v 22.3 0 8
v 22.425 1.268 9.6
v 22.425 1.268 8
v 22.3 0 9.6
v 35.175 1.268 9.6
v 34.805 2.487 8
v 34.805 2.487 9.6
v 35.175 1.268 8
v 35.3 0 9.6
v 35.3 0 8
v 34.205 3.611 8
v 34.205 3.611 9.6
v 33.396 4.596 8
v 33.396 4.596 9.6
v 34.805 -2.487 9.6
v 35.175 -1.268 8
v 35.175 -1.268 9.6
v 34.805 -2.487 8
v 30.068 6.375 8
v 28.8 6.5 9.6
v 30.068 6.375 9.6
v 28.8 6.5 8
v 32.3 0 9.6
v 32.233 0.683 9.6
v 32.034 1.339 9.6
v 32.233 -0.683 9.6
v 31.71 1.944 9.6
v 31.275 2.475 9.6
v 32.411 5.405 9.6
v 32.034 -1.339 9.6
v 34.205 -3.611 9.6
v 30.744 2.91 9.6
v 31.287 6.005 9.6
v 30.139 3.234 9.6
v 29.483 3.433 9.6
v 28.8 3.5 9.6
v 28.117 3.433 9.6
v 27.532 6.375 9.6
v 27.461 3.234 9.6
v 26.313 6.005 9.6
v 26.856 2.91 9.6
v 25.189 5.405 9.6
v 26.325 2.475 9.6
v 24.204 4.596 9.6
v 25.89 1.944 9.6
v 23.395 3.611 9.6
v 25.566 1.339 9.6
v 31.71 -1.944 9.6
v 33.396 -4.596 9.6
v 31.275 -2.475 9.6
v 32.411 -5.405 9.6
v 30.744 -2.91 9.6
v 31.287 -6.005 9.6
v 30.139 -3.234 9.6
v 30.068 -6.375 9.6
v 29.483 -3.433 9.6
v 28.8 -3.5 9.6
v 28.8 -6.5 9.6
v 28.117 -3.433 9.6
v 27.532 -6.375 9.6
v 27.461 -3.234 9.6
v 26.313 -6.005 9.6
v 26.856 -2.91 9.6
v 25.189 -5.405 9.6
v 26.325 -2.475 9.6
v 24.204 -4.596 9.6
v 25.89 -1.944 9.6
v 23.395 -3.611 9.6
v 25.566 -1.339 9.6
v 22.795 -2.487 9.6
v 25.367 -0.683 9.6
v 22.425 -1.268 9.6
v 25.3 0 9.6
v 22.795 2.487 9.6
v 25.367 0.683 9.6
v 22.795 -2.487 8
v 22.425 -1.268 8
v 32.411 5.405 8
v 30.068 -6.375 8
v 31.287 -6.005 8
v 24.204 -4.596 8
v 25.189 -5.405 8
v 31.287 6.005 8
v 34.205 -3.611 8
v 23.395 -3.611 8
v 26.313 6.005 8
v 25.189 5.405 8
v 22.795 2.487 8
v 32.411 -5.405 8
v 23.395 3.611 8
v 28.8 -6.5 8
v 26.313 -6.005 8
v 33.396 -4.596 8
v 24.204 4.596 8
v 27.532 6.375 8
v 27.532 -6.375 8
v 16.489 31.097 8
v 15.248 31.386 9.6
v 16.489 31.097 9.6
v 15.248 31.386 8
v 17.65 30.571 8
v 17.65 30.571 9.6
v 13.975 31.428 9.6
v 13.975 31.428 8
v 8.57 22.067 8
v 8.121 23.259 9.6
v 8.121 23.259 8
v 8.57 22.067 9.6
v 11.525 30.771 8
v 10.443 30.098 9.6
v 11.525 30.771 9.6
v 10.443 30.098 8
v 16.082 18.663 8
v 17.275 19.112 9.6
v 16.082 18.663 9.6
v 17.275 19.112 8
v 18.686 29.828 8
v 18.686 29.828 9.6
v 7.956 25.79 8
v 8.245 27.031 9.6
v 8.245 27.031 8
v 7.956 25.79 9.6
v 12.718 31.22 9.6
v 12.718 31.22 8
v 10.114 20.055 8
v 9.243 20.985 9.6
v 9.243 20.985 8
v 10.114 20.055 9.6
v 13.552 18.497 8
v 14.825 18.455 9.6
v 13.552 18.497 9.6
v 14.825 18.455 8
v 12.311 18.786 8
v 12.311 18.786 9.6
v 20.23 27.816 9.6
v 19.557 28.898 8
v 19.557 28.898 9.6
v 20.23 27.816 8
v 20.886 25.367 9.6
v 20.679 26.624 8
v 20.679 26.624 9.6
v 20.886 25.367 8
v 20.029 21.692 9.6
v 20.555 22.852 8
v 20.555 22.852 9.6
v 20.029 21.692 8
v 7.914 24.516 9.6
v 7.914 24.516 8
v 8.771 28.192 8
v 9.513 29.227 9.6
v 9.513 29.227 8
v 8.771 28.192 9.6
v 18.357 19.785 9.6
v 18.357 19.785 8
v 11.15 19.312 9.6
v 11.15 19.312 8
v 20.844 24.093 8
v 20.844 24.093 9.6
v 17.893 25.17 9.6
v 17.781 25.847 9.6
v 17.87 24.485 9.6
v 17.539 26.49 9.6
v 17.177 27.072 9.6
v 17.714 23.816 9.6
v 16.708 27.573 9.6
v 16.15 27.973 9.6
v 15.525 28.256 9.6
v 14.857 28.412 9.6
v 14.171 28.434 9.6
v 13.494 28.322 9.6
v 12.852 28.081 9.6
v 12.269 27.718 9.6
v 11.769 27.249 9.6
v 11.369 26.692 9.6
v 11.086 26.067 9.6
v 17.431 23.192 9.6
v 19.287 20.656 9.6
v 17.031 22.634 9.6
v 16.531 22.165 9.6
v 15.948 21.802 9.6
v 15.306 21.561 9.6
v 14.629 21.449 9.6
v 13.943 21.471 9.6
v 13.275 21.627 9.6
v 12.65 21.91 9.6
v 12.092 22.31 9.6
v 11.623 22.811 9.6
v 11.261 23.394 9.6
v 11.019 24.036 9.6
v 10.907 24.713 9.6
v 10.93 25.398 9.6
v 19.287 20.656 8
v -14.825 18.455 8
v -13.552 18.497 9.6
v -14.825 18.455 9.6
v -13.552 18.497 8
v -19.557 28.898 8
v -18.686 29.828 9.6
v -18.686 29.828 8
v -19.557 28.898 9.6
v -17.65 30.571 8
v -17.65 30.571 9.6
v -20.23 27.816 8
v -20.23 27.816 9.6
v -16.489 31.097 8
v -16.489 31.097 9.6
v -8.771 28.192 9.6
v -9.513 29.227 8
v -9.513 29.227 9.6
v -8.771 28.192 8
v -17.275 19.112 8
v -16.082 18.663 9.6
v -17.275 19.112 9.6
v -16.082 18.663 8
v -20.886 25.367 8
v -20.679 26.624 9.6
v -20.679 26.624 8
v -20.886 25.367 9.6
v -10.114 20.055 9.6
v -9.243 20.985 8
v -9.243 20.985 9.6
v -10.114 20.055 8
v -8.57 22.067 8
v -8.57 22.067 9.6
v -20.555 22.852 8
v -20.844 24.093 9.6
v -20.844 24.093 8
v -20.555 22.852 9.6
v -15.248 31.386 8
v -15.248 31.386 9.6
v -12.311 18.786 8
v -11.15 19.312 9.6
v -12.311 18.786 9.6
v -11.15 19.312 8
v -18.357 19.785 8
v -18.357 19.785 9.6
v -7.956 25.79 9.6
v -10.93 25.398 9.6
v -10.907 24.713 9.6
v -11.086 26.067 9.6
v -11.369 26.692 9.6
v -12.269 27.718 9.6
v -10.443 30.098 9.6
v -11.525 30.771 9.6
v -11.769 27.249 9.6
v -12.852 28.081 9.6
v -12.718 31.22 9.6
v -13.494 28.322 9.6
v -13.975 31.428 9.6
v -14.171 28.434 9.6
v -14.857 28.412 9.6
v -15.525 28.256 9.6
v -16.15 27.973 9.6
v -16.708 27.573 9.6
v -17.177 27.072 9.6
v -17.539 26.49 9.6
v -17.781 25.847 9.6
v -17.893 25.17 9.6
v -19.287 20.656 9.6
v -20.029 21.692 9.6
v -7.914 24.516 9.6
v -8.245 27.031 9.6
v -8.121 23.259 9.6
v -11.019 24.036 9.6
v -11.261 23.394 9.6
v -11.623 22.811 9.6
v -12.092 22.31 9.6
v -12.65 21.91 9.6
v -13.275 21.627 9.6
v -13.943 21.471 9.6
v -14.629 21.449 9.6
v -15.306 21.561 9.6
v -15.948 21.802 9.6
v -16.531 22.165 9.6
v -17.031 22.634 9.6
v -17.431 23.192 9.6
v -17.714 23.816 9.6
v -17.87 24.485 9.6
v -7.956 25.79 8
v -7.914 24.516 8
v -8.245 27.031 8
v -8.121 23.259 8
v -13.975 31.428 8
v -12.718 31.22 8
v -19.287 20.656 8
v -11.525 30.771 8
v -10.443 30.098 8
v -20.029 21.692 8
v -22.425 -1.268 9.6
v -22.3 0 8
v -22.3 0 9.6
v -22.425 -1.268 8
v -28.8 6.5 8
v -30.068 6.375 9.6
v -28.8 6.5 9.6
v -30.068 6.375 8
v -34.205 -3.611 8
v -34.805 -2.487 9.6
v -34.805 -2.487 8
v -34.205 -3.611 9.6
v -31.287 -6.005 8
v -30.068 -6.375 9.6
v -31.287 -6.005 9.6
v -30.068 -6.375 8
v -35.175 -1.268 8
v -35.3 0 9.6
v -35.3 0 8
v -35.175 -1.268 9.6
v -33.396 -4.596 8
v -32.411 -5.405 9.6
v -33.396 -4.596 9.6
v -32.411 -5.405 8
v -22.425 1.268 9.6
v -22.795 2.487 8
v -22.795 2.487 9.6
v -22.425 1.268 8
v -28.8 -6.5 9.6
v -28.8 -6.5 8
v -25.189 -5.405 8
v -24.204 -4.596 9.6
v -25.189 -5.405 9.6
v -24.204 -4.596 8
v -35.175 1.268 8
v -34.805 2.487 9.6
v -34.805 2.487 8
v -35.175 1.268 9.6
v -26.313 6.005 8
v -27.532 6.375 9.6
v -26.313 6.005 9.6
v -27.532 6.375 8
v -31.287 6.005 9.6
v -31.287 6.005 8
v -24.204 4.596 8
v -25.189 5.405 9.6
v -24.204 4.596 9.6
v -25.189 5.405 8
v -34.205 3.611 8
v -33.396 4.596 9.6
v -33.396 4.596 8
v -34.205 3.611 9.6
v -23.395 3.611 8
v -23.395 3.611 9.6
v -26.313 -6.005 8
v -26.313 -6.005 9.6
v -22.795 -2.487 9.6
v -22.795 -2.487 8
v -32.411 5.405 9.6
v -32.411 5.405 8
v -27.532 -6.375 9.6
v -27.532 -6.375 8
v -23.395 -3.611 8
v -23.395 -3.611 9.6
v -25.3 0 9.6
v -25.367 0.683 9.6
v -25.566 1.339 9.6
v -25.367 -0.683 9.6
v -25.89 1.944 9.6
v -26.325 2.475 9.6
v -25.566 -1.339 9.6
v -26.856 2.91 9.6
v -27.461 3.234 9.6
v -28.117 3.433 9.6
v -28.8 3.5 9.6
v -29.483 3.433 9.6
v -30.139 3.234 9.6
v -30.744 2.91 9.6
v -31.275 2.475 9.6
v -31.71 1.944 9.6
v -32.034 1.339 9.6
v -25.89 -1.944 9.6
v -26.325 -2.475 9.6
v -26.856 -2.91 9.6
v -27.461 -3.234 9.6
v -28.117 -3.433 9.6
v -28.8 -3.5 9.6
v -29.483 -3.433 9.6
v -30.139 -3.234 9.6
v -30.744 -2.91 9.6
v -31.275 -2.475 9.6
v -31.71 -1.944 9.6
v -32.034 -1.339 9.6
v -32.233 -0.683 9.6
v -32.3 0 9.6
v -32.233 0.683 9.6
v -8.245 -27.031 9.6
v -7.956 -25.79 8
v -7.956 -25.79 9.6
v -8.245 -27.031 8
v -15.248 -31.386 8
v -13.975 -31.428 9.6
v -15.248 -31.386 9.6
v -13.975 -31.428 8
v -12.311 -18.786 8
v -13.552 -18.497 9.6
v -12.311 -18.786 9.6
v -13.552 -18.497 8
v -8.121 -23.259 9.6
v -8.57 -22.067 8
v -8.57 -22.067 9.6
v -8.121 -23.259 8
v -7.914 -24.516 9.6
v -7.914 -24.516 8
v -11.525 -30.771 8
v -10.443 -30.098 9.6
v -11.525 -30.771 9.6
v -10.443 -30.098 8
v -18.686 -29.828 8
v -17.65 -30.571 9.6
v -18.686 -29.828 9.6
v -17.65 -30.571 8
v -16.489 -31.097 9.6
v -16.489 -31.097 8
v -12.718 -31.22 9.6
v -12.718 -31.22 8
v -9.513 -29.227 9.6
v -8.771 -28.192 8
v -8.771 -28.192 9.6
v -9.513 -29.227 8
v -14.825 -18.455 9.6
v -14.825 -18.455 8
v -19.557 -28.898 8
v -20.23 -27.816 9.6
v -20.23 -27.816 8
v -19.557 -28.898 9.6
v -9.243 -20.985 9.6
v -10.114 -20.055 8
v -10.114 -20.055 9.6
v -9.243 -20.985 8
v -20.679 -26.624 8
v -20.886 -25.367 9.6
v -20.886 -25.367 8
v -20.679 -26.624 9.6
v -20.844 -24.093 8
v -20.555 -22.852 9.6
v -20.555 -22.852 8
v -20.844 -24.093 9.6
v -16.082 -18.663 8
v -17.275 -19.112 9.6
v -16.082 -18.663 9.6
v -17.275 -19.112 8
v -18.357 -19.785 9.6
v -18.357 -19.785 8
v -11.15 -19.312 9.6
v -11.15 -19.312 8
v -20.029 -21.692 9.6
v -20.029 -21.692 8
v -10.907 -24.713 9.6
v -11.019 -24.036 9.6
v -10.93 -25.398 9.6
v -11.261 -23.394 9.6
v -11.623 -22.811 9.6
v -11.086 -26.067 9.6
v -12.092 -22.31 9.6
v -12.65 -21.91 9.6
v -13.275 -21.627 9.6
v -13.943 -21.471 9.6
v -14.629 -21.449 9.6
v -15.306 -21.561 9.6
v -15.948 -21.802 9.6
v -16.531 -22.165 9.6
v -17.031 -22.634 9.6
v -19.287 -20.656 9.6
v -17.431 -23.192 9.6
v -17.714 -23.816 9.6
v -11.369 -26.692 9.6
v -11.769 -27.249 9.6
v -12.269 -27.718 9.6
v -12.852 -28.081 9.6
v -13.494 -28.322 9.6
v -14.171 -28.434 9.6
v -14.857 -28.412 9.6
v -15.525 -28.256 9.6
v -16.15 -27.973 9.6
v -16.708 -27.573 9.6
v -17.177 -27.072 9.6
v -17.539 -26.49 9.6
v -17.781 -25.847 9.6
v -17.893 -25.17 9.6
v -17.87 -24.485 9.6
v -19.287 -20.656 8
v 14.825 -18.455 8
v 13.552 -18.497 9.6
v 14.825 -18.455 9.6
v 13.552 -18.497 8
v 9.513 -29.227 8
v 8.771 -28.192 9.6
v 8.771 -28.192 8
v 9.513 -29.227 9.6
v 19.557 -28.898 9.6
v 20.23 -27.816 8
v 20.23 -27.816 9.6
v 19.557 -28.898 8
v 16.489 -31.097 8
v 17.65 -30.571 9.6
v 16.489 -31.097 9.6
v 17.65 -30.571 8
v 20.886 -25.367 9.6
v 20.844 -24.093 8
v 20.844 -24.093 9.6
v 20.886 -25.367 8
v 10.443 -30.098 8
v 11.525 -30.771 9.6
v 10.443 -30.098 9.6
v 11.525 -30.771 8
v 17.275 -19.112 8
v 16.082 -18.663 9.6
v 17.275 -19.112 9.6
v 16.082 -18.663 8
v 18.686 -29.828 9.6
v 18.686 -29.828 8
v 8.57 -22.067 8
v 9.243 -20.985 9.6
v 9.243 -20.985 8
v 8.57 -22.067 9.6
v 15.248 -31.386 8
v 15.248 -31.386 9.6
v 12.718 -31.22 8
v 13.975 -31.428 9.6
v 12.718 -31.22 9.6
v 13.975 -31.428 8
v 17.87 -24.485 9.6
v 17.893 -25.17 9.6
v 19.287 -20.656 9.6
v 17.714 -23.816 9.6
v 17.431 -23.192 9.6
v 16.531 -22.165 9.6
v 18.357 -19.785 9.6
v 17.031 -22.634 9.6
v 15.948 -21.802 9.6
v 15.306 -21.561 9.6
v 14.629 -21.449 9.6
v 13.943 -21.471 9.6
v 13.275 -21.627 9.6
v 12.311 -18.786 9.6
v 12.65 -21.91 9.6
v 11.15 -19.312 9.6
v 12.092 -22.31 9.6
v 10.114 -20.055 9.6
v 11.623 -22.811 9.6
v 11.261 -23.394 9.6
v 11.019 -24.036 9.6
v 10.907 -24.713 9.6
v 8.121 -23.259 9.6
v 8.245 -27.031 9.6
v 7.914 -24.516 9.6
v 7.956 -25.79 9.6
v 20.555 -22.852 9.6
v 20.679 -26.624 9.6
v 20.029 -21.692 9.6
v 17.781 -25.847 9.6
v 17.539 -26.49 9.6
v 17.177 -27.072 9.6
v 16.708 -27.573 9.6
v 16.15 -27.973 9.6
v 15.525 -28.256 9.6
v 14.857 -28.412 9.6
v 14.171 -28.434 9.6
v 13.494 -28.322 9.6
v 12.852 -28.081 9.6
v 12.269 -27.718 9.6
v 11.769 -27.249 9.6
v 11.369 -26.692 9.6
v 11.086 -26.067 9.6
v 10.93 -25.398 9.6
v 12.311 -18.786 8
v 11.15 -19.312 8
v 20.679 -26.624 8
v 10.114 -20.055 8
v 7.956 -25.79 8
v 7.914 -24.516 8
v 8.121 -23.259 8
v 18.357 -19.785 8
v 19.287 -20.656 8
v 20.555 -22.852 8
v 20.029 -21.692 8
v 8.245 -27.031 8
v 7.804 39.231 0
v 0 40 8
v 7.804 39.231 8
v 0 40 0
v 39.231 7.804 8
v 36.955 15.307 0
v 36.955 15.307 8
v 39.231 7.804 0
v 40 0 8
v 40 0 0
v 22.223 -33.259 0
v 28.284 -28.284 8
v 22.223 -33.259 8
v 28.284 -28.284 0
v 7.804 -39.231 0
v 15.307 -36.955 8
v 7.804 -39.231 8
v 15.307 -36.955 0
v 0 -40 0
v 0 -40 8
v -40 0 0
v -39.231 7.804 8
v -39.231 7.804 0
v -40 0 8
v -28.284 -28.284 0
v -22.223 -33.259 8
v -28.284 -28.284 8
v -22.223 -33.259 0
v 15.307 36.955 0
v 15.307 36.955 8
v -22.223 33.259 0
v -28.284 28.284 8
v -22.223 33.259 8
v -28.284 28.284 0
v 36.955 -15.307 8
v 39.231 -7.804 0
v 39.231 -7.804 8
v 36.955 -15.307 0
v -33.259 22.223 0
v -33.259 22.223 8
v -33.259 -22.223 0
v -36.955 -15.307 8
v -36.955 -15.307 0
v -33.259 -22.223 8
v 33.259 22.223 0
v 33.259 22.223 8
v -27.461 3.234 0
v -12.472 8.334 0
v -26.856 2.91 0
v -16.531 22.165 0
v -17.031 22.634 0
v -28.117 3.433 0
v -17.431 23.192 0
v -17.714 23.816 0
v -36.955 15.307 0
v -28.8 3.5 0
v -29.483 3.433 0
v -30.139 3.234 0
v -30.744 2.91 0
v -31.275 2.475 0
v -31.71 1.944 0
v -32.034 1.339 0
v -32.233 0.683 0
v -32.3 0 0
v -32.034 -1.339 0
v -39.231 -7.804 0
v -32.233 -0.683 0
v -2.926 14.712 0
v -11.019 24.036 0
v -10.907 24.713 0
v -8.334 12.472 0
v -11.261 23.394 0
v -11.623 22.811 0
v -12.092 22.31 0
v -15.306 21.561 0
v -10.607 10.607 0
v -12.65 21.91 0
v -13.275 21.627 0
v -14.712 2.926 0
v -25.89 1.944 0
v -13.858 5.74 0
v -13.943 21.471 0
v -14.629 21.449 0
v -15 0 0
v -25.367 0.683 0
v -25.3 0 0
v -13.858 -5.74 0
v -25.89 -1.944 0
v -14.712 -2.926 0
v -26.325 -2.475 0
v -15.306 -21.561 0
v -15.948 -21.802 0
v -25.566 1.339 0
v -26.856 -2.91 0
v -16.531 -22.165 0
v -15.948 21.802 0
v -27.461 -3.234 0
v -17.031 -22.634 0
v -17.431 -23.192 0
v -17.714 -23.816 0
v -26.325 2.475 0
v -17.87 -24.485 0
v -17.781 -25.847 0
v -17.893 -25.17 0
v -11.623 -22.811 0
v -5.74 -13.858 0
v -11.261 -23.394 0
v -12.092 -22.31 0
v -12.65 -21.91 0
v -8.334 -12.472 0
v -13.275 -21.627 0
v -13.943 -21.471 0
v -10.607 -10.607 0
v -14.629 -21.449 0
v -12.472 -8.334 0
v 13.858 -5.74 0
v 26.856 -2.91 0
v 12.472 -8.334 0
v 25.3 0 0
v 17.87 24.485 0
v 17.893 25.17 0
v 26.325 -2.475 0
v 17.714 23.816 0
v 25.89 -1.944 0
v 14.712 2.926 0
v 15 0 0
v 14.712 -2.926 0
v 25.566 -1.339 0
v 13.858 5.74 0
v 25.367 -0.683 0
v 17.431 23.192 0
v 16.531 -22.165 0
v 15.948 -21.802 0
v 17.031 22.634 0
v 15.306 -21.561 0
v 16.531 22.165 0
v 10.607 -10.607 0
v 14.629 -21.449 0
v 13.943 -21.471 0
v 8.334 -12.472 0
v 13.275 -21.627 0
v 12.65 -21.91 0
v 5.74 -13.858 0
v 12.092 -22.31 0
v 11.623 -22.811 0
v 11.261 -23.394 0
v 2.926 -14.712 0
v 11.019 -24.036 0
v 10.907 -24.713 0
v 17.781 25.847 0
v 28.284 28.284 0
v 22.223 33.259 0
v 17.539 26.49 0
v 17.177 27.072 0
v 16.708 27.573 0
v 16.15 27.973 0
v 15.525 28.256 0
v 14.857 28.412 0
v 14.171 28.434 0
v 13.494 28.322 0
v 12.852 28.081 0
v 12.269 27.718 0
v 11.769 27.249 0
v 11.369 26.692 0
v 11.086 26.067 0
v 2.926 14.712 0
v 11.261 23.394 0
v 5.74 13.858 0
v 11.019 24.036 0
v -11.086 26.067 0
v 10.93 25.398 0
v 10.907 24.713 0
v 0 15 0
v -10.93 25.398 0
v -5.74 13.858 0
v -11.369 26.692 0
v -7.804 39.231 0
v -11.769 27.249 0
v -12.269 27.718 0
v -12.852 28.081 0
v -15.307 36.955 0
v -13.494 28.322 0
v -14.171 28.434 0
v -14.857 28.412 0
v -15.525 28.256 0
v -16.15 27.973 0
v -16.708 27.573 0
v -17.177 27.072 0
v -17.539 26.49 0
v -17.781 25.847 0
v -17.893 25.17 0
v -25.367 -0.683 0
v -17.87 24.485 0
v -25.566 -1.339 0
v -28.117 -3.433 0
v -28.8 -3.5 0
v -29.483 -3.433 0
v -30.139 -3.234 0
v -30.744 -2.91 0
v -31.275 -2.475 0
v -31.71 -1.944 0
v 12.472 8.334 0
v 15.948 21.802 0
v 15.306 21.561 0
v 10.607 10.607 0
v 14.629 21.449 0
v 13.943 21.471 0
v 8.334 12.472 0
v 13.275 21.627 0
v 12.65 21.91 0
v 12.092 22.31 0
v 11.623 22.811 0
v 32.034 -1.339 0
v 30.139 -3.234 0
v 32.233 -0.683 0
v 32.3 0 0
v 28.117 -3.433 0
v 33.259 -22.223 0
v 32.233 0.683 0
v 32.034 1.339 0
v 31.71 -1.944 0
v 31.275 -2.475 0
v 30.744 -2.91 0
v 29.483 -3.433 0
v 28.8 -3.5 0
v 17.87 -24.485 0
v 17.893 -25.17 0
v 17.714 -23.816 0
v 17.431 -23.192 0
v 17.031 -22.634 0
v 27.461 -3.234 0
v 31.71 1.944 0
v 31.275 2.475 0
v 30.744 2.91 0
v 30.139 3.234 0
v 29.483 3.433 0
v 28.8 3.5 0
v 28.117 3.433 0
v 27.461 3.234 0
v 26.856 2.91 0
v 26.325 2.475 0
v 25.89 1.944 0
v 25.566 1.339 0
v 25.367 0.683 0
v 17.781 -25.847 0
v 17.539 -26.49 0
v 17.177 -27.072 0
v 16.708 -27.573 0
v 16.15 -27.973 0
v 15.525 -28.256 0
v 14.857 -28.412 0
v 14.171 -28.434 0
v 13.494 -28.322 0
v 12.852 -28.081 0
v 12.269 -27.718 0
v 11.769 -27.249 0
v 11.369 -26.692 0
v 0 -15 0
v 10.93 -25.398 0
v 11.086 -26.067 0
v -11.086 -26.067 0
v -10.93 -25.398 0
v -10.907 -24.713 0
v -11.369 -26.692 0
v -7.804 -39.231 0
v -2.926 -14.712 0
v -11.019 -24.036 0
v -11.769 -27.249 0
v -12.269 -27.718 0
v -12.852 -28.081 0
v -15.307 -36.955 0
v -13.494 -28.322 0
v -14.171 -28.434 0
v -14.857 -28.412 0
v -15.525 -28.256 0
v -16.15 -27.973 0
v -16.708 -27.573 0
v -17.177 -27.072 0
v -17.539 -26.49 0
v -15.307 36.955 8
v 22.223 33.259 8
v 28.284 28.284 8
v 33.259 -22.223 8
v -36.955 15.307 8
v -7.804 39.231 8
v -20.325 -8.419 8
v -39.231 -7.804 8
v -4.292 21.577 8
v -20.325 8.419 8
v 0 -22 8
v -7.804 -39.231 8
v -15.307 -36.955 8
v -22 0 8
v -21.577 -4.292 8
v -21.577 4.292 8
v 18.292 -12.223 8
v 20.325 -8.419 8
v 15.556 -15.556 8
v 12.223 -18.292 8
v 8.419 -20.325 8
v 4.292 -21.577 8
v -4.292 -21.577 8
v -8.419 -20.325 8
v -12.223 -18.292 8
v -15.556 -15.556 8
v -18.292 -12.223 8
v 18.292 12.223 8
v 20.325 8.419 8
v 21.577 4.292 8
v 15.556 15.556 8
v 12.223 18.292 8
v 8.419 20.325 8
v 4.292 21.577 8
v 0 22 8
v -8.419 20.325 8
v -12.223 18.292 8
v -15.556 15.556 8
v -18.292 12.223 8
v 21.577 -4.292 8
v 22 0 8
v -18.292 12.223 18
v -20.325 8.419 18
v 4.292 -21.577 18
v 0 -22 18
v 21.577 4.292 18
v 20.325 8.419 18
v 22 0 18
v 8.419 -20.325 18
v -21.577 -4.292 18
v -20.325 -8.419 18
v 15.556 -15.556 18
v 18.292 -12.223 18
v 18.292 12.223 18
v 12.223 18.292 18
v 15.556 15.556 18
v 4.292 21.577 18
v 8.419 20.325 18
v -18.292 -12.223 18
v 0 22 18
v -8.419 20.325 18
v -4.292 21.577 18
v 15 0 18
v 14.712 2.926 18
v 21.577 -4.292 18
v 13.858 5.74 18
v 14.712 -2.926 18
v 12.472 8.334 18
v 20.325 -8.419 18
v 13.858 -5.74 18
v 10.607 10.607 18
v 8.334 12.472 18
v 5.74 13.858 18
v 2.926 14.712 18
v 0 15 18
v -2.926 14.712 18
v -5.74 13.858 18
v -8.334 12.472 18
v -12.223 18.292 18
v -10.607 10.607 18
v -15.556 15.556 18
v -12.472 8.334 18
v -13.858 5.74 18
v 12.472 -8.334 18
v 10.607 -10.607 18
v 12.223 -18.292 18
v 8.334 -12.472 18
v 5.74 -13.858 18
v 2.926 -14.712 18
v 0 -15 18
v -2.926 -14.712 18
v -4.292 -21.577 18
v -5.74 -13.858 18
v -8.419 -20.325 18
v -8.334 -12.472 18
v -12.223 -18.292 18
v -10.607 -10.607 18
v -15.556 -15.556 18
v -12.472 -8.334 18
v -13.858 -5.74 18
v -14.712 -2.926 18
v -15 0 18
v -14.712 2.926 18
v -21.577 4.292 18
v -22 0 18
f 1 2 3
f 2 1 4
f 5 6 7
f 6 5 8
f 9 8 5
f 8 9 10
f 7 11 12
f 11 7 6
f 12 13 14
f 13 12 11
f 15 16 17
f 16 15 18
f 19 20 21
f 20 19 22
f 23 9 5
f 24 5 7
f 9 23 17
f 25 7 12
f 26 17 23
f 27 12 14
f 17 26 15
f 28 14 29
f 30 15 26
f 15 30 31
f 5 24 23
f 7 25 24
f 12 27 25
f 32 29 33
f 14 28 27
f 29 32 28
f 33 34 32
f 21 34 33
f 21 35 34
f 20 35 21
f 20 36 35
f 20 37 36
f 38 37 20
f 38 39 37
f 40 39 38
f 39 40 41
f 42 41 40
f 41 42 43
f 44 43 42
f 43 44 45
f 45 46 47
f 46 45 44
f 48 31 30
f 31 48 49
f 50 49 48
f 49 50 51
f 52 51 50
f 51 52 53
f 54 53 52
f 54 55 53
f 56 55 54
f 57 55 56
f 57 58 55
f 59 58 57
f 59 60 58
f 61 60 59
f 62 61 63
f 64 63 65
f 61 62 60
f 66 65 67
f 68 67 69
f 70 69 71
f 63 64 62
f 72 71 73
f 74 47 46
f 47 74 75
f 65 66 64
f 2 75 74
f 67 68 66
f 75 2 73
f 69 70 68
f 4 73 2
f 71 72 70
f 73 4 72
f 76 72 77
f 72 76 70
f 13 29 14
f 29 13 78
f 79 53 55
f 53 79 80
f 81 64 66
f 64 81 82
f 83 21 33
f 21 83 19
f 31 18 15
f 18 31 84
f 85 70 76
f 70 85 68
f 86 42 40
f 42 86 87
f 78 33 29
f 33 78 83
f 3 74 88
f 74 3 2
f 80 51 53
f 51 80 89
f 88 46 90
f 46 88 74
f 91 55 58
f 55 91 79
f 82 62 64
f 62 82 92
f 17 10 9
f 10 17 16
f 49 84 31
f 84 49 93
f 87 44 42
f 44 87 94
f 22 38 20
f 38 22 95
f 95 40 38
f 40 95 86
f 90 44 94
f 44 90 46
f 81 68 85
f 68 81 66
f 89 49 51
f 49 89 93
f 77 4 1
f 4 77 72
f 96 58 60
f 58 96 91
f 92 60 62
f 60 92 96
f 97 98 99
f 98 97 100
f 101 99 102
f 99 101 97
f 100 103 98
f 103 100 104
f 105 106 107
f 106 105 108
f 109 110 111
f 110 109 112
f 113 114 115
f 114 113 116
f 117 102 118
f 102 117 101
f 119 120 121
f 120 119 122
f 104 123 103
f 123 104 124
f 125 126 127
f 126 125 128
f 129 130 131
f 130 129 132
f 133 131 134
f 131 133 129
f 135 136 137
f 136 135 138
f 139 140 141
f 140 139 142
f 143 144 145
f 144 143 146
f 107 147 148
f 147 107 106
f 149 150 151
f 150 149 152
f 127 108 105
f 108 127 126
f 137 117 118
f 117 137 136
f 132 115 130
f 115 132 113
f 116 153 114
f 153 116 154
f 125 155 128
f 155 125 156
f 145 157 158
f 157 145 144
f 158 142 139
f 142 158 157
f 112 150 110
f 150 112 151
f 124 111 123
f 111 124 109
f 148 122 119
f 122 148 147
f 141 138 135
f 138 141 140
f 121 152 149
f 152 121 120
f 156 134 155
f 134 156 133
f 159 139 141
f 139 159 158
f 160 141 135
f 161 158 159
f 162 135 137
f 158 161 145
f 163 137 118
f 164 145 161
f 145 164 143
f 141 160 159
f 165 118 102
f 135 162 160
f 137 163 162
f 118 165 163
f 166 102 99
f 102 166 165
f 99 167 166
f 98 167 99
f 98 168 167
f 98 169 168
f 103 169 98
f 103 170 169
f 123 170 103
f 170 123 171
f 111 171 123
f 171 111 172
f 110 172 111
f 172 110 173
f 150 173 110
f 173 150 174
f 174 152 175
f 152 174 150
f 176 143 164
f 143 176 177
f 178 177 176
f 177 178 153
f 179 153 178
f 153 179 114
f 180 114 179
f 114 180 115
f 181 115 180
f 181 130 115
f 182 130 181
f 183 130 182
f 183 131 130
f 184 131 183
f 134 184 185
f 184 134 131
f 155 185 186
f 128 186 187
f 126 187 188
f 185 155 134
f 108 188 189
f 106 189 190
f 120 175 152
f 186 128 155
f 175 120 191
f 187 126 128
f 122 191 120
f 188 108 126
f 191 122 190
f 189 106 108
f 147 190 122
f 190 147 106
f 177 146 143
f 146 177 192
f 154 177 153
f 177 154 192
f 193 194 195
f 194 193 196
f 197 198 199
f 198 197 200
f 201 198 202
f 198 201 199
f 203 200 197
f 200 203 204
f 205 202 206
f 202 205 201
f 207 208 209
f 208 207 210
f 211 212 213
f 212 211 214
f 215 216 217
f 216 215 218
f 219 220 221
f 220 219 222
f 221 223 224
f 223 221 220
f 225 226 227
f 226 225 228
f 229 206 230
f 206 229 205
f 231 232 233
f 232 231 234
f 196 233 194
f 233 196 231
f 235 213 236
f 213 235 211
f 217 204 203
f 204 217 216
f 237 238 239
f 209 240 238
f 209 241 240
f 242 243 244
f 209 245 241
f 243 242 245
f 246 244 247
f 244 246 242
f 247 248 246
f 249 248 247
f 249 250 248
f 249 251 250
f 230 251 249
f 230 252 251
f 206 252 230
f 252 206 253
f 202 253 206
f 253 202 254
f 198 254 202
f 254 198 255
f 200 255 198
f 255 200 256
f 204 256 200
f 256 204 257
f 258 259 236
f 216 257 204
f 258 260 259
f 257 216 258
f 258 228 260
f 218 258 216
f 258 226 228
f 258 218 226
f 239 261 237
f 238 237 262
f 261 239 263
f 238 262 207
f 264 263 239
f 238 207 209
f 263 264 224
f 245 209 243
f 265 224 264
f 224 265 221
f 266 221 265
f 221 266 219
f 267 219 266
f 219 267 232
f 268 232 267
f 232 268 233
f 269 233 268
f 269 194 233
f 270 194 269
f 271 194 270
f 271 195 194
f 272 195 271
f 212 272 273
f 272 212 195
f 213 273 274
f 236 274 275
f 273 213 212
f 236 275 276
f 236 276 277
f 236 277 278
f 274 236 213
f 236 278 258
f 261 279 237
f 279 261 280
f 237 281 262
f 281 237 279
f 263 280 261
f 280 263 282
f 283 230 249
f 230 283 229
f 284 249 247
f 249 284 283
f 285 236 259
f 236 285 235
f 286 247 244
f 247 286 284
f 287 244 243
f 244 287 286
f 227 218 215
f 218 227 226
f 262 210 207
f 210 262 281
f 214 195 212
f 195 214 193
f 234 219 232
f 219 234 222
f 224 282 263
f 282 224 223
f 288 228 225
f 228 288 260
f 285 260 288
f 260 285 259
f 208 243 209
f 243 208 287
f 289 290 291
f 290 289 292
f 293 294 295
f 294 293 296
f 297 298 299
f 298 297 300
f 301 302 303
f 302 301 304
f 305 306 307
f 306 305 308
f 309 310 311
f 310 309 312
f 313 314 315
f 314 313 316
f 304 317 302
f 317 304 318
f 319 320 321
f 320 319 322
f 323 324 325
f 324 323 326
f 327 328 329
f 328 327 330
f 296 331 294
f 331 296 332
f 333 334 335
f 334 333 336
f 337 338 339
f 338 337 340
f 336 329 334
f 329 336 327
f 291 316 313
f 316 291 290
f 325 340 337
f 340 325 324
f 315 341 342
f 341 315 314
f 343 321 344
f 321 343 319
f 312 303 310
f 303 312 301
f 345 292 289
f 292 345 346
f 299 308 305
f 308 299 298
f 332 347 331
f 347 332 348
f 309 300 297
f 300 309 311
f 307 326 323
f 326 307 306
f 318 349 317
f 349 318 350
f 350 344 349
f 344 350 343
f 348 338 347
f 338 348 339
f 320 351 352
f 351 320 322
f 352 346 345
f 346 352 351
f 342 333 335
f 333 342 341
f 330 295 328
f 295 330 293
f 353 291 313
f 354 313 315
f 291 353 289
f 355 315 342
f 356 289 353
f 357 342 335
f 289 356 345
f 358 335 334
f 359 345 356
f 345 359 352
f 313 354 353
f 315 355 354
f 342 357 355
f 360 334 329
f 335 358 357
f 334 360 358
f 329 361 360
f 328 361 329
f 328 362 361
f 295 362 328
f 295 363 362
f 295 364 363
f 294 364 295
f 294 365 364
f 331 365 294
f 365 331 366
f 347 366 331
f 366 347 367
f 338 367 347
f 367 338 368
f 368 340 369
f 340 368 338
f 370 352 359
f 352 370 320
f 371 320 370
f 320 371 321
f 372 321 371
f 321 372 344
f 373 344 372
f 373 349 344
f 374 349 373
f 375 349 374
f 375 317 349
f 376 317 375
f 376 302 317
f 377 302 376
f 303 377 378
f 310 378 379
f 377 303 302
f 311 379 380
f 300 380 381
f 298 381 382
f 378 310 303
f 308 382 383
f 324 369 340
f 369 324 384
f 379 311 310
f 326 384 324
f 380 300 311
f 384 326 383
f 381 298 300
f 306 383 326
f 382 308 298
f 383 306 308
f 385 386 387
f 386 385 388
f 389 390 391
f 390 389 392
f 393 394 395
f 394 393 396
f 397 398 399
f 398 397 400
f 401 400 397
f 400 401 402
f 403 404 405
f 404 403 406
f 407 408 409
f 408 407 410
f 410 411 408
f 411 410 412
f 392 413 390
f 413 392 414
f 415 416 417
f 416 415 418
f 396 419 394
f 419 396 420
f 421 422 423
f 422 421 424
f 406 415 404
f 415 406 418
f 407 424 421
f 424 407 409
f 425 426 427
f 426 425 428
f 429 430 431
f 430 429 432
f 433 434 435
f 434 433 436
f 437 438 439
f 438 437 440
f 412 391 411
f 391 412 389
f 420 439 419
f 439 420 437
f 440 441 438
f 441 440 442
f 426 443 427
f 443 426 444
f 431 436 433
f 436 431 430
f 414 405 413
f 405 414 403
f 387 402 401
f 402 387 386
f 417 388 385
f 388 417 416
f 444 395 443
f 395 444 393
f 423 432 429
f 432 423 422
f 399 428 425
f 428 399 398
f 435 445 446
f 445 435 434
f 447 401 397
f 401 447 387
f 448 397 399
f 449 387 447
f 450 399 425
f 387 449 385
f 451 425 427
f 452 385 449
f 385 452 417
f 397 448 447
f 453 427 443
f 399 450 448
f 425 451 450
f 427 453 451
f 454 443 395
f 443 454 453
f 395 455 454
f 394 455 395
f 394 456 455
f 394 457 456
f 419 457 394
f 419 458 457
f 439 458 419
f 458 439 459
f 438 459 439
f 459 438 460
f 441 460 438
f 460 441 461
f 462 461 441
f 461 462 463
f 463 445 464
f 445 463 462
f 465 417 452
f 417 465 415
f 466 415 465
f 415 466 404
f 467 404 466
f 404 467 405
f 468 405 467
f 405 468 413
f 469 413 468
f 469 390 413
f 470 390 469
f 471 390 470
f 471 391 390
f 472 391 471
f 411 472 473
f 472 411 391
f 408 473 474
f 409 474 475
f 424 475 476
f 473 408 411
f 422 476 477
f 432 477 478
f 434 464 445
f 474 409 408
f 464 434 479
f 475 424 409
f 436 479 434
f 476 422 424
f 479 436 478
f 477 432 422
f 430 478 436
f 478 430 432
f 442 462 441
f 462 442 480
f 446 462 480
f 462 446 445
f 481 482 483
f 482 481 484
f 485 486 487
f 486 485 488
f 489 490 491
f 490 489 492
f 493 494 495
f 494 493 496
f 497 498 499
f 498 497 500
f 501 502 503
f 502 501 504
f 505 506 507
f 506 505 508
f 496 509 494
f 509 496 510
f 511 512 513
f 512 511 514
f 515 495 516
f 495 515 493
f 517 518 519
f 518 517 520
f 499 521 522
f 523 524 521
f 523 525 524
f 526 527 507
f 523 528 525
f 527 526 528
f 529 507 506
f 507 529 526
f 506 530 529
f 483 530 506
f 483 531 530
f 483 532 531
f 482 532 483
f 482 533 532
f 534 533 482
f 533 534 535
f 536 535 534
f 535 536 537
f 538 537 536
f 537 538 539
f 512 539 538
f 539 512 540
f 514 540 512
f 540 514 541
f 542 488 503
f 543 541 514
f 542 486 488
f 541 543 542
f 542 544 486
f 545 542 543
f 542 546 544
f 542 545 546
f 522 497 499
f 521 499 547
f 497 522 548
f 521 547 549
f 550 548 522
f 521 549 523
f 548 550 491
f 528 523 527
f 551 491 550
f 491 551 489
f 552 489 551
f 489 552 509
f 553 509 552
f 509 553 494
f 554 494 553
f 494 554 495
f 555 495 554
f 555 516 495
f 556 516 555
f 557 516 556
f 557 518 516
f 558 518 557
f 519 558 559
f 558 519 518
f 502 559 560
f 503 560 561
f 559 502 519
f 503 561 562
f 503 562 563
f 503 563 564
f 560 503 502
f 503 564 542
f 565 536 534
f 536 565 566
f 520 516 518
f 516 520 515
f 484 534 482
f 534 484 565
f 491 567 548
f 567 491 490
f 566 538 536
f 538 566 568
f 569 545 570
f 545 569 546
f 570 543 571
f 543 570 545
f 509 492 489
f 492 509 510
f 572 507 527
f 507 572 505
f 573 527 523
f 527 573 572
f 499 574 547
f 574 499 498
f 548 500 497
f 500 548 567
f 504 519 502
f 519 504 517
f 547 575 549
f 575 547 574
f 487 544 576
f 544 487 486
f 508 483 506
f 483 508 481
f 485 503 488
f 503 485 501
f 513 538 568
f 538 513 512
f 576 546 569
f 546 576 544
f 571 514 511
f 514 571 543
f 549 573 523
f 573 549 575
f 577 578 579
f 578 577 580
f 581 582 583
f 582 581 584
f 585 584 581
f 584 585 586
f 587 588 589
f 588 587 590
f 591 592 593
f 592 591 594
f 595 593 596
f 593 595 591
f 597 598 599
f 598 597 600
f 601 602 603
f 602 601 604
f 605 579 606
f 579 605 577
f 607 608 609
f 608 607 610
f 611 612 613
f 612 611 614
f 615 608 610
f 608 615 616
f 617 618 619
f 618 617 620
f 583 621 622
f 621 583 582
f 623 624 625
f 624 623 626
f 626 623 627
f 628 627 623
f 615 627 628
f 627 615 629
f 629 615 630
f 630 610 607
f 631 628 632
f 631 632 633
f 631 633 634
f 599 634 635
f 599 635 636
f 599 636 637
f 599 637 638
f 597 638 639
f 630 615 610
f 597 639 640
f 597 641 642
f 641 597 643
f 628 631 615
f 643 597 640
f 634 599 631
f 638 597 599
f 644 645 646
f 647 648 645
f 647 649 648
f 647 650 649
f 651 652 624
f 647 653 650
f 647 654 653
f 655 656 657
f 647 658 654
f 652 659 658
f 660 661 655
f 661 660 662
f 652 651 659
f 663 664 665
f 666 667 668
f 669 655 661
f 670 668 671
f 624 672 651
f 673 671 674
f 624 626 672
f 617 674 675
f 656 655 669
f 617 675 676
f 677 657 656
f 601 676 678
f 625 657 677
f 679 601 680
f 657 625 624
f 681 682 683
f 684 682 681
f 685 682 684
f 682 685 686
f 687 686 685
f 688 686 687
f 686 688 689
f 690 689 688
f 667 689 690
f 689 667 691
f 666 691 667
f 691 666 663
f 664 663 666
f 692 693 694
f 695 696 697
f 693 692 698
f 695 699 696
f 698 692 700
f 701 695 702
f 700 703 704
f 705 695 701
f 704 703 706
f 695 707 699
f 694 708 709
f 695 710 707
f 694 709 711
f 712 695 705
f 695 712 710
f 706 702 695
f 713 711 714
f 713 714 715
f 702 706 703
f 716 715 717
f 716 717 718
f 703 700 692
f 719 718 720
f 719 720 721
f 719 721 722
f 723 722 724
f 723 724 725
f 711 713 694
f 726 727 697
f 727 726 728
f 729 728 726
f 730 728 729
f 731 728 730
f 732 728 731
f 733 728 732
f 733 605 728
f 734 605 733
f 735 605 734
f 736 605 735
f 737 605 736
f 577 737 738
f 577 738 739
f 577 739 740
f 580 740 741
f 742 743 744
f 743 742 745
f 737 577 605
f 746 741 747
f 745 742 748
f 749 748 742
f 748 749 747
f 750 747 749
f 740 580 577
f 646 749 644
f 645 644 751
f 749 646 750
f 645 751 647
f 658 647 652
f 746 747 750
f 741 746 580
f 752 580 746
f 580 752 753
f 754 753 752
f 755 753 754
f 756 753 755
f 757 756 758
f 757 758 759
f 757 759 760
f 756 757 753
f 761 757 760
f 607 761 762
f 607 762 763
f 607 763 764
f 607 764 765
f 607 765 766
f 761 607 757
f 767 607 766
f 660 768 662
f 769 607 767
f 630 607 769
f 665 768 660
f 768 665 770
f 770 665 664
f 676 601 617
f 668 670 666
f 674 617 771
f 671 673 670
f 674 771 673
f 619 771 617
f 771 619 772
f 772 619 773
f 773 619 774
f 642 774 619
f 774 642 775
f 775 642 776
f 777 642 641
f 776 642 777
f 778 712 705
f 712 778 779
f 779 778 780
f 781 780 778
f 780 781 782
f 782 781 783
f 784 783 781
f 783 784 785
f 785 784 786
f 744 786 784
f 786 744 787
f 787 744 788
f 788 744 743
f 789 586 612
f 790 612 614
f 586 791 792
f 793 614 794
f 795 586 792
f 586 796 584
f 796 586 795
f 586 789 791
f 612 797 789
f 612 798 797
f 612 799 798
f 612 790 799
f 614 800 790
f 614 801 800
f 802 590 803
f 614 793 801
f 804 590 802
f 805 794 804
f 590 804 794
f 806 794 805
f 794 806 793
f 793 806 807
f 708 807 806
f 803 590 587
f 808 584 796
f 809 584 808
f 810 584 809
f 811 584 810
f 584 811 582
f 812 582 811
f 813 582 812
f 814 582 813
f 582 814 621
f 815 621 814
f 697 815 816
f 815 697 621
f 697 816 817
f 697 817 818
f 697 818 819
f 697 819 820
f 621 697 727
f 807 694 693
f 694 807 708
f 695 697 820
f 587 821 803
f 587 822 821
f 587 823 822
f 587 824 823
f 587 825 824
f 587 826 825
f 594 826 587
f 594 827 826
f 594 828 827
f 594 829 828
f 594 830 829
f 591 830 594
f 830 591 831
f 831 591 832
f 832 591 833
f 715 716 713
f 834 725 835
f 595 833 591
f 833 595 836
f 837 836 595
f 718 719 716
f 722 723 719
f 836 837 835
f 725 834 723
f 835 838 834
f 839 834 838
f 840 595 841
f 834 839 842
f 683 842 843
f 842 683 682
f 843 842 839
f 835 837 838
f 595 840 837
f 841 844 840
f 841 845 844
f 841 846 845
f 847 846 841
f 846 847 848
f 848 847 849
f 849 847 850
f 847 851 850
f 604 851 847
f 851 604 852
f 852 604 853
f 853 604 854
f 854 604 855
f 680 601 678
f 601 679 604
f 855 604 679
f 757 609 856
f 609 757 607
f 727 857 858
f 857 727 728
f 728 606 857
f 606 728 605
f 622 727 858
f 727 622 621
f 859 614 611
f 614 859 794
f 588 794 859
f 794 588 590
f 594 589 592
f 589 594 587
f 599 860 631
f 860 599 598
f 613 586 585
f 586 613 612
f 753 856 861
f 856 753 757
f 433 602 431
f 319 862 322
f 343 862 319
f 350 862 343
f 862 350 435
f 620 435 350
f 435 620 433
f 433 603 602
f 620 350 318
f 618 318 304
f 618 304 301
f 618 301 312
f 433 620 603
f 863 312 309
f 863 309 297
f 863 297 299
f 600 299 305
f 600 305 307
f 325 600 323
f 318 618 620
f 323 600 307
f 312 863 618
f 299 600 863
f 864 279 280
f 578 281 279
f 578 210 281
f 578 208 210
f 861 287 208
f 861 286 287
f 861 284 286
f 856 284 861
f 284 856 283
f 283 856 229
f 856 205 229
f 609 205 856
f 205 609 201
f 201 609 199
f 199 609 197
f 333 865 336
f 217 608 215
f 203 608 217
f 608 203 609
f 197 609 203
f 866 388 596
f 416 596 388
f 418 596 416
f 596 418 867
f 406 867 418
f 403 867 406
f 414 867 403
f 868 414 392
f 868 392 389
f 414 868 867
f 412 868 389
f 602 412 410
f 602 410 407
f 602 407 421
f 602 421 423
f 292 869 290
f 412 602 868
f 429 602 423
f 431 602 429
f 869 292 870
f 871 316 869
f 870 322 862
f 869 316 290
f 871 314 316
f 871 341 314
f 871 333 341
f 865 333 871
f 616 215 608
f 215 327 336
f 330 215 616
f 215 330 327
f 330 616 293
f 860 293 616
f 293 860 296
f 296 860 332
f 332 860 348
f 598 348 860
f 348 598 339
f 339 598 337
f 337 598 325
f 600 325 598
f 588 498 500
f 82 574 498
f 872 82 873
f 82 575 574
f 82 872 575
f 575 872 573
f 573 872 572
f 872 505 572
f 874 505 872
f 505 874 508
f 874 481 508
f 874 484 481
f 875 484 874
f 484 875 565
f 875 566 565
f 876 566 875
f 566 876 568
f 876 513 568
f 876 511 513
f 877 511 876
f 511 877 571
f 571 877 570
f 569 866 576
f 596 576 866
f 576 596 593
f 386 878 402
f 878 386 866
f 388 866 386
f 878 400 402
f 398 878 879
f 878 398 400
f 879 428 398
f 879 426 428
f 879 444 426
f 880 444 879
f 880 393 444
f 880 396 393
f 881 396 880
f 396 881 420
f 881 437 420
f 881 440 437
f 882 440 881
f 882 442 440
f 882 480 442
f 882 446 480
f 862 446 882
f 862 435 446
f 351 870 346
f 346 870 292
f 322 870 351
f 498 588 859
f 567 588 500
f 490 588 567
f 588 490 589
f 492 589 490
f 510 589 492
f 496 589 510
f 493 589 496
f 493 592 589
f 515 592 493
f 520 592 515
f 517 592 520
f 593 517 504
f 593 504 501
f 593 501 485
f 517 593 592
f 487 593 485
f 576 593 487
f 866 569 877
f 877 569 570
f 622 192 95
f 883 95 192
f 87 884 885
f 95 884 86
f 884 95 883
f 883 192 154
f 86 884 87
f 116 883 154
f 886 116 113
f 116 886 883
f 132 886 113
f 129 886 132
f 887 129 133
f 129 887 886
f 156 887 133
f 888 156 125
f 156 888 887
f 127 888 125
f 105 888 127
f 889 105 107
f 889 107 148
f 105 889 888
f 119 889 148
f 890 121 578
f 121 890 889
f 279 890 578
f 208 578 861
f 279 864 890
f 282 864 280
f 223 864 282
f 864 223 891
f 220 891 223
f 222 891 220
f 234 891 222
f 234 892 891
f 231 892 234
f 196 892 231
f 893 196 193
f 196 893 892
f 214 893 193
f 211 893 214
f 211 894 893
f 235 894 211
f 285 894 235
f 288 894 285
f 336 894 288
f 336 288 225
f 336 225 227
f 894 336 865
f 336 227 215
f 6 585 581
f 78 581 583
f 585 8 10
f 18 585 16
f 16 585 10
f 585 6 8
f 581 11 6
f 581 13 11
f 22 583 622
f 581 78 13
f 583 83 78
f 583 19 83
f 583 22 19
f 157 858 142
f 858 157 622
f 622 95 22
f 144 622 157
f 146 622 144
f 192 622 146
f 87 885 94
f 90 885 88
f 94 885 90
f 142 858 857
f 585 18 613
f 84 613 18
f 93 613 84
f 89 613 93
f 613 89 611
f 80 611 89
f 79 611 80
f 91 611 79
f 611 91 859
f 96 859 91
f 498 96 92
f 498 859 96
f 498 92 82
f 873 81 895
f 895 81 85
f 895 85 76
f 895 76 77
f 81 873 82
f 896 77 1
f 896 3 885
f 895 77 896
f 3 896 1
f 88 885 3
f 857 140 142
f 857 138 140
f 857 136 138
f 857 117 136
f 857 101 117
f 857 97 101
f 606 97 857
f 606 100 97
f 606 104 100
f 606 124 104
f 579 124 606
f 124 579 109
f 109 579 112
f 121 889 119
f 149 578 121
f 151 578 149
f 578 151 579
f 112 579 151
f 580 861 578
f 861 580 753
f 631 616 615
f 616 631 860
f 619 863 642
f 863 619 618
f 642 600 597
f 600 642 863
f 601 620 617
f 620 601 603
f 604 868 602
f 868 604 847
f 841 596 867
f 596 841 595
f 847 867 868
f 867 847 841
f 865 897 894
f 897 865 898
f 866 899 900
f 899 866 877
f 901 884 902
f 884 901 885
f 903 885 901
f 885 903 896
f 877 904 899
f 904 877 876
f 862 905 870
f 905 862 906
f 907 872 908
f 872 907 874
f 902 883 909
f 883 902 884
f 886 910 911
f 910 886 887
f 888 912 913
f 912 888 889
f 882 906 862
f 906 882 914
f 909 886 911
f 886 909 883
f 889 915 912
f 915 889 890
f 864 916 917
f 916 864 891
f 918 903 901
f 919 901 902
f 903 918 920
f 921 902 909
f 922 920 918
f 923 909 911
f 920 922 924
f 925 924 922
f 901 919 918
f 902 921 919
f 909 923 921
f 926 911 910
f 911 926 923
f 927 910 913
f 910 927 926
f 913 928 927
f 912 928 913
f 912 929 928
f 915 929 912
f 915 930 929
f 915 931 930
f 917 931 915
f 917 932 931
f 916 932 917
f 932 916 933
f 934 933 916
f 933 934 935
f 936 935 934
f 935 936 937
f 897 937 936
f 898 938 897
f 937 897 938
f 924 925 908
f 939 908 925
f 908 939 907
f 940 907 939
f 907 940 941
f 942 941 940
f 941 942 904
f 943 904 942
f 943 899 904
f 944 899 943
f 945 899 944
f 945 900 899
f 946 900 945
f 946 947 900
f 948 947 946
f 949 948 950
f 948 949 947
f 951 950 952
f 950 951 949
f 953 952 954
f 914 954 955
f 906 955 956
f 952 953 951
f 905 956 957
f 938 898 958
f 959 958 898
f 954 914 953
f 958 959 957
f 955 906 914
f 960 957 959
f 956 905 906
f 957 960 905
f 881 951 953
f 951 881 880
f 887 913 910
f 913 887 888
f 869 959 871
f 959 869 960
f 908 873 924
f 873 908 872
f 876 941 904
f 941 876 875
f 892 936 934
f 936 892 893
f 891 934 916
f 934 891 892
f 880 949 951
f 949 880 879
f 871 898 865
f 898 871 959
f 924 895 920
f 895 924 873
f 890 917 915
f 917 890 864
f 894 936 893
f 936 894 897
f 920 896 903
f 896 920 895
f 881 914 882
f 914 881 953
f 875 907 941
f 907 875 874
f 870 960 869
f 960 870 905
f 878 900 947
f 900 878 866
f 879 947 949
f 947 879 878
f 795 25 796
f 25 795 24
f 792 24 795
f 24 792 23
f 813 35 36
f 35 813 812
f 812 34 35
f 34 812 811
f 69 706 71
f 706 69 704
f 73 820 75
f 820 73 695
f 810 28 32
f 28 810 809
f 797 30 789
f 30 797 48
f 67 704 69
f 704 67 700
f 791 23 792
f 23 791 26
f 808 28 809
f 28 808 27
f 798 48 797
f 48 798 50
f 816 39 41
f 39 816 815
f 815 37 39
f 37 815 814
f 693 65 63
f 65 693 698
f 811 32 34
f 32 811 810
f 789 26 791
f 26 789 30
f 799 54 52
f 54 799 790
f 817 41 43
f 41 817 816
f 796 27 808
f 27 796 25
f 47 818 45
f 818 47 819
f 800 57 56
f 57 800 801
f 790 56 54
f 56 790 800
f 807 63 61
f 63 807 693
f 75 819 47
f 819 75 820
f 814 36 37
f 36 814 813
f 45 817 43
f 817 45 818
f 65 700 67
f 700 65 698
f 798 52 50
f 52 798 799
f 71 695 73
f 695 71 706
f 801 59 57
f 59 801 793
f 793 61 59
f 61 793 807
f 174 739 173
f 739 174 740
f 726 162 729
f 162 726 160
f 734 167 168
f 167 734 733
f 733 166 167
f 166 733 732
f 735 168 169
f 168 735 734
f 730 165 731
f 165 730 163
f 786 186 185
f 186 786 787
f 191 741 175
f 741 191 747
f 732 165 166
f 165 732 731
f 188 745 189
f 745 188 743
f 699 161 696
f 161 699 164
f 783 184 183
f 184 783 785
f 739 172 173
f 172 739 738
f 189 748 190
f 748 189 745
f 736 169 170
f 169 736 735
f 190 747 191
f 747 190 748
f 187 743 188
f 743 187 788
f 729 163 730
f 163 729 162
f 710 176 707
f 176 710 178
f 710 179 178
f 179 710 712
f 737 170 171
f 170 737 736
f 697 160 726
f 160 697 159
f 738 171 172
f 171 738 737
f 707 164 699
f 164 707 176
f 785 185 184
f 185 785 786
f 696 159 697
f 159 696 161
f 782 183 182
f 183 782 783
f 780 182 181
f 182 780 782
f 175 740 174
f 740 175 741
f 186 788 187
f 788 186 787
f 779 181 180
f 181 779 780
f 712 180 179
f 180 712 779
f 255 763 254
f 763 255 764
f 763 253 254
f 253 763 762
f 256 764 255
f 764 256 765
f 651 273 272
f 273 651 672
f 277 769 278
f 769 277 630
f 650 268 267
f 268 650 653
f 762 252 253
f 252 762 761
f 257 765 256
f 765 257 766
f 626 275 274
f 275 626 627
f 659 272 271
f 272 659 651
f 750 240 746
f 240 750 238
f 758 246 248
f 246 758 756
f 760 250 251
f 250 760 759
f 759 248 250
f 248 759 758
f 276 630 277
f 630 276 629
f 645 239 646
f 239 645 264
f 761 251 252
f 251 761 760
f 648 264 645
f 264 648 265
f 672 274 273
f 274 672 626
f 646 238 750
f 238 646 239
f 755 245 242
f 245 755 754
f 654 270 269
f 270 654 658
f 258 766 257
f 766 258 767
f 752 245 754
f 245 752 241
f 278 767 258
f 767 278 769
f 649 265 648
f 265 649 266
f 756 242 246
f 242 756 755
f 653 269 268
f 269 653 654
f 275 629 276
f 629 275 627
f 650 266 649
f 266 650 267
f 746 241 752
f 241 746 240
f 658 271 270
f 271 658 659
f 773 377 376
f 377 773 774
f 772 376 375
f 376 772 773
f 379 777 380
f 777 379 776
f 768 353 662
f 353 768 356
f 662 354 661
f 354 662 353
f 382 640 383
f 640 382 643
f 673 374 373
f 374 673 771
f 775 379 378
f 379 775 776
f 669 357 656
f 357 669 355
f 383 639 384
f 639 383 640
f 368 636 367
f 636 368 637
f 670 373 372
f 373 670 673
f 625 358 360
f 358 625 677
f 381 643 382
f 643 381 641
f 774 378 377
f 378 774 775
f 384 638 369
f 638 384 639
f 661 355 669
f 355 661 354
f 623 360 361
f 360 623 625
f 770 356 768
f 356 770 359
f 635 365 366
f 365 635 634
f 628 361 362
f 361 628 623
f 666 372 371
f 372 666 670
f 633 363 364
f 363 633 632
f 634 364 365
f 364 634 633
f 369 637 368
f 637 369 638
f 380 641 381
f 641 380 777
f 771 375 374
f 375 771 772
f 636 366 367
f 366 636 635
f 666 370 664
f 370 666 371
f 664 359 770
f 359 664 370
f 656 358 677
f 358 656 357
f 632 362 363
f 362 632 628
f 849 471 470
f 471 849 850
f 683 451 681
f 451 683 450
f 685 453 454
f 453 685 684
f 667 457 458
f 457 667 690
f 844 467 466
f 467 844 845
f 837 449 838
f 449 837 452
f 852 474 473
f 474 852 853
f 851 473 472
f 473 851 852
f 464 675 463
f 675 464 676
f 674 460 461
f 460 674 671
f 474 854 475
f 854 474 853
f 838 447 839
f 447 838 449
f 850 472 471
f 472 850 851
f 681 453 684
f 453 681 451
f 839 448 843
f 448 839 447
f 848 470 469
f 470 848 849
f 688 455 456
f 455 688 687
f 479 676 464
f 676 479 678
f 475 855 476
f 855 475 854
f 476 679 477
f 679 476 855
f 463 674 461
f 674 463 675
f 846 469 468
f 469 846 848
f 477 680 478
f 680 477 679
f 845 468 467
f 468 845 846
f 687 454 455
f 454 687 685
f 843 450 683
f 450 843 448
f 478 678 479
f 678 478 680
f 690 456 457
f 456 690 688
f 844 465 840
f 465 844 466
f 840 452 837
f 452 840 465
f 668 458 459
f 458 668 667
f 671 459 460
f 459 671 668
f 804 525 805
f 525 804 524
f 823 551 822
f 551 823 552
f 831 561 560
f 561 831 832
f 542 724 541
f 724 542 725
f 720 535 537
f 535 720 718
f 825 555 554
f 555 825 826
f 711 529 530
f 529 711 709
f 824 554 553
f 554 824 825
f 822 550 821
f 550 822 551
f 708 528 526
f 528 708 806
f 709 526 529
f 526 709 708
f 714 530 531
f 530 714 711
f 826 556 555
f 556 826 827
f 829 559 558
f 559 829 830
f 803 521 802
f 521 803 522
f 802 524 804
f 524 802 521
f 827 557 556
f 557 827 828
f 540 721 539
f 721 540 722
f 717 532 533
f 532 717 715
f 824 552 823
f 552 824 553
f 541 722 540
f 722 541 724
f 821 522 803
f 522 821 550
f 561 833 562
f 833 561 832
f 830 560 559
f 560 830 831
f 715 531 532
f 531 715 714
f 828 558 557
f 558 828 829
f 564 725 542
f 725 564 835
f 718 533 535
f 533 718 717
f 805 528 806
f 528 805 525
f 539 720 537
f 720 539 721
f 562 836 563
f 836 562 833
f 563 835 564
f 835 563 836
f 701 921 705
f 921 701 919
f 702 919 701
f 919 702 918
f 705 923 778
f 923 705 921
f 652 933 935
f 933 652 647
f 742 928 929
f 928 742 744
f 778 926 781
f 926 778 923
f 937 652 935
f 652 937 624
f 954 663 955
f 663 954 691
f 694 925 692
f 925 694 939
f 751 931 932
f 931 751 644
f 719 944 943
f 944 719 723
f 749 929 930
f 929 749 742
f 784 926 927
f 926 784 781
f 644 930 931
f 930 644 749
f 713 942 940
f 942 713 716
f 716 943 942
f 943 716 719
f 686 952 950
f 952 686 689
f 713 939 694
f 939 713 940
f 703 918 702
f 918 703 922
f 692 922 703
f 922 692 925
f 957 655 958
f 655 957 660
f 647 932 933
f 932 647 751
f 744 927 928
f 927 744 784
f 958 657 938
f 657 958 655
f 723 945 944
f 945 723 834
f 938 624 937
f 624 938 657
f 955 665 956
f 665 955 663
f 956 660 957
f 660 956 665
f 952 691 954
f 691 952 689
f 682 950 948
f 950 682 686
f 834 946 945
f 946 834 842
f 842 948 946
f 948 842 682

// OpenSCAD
$fn = 32;

// ----------------------------------------------------------------------
// Bolt-circle flange: 80 mm outside, 6 bolt holes, bore 30 mm
// ----------------------------------------------------------------------

// --- parameters (mm) ---
flange_d = 80;            // flange outside diameter
flange_t = 8;             // flange thickness
bolts = 6;                // number of bolt holes
bolt_d = 7;               // bolt clearance
bolt_r = 28.8;            // bolt circle radius
bore_d = 30;              // centre bore
hub_d = 44;               // raised hub diameter
hub_h = 10;               // raised hub height
spot_d = 13;              // spot faced bosses
spot_h = 1.6;             // spot face height

module body() {
  cylinder(h = flange_t, d = flange_d);
  /* raised hub, sunk 1 mm into the flange */
  translate([0, 0, flange_t - 1]) cylinder(h = hub_h + 1, d = hub_d);
  /* spot faced pads under the bolt heads */
  for (i = [0 : bolts - 1]) rotate([0, 0, i * 360 / bolts]) translate([bolt_r, 0, flange_t - 1]) cylinder(h = spot_h + 1, d = spot_d);
}

difference() {
  body();
  /* bolt circle */
  for (i = [0 : bolts - 1]) rotate([0, 0, i * 360 / bolts]) translate([bolt_r, 0, -1]) cylinder(h = flange_t + hub_h + 3, d = bolt_d);
  translate([0, 0, -1]) cylinder(h = flange_t + hub_h + 3, d = bore_d);
}
